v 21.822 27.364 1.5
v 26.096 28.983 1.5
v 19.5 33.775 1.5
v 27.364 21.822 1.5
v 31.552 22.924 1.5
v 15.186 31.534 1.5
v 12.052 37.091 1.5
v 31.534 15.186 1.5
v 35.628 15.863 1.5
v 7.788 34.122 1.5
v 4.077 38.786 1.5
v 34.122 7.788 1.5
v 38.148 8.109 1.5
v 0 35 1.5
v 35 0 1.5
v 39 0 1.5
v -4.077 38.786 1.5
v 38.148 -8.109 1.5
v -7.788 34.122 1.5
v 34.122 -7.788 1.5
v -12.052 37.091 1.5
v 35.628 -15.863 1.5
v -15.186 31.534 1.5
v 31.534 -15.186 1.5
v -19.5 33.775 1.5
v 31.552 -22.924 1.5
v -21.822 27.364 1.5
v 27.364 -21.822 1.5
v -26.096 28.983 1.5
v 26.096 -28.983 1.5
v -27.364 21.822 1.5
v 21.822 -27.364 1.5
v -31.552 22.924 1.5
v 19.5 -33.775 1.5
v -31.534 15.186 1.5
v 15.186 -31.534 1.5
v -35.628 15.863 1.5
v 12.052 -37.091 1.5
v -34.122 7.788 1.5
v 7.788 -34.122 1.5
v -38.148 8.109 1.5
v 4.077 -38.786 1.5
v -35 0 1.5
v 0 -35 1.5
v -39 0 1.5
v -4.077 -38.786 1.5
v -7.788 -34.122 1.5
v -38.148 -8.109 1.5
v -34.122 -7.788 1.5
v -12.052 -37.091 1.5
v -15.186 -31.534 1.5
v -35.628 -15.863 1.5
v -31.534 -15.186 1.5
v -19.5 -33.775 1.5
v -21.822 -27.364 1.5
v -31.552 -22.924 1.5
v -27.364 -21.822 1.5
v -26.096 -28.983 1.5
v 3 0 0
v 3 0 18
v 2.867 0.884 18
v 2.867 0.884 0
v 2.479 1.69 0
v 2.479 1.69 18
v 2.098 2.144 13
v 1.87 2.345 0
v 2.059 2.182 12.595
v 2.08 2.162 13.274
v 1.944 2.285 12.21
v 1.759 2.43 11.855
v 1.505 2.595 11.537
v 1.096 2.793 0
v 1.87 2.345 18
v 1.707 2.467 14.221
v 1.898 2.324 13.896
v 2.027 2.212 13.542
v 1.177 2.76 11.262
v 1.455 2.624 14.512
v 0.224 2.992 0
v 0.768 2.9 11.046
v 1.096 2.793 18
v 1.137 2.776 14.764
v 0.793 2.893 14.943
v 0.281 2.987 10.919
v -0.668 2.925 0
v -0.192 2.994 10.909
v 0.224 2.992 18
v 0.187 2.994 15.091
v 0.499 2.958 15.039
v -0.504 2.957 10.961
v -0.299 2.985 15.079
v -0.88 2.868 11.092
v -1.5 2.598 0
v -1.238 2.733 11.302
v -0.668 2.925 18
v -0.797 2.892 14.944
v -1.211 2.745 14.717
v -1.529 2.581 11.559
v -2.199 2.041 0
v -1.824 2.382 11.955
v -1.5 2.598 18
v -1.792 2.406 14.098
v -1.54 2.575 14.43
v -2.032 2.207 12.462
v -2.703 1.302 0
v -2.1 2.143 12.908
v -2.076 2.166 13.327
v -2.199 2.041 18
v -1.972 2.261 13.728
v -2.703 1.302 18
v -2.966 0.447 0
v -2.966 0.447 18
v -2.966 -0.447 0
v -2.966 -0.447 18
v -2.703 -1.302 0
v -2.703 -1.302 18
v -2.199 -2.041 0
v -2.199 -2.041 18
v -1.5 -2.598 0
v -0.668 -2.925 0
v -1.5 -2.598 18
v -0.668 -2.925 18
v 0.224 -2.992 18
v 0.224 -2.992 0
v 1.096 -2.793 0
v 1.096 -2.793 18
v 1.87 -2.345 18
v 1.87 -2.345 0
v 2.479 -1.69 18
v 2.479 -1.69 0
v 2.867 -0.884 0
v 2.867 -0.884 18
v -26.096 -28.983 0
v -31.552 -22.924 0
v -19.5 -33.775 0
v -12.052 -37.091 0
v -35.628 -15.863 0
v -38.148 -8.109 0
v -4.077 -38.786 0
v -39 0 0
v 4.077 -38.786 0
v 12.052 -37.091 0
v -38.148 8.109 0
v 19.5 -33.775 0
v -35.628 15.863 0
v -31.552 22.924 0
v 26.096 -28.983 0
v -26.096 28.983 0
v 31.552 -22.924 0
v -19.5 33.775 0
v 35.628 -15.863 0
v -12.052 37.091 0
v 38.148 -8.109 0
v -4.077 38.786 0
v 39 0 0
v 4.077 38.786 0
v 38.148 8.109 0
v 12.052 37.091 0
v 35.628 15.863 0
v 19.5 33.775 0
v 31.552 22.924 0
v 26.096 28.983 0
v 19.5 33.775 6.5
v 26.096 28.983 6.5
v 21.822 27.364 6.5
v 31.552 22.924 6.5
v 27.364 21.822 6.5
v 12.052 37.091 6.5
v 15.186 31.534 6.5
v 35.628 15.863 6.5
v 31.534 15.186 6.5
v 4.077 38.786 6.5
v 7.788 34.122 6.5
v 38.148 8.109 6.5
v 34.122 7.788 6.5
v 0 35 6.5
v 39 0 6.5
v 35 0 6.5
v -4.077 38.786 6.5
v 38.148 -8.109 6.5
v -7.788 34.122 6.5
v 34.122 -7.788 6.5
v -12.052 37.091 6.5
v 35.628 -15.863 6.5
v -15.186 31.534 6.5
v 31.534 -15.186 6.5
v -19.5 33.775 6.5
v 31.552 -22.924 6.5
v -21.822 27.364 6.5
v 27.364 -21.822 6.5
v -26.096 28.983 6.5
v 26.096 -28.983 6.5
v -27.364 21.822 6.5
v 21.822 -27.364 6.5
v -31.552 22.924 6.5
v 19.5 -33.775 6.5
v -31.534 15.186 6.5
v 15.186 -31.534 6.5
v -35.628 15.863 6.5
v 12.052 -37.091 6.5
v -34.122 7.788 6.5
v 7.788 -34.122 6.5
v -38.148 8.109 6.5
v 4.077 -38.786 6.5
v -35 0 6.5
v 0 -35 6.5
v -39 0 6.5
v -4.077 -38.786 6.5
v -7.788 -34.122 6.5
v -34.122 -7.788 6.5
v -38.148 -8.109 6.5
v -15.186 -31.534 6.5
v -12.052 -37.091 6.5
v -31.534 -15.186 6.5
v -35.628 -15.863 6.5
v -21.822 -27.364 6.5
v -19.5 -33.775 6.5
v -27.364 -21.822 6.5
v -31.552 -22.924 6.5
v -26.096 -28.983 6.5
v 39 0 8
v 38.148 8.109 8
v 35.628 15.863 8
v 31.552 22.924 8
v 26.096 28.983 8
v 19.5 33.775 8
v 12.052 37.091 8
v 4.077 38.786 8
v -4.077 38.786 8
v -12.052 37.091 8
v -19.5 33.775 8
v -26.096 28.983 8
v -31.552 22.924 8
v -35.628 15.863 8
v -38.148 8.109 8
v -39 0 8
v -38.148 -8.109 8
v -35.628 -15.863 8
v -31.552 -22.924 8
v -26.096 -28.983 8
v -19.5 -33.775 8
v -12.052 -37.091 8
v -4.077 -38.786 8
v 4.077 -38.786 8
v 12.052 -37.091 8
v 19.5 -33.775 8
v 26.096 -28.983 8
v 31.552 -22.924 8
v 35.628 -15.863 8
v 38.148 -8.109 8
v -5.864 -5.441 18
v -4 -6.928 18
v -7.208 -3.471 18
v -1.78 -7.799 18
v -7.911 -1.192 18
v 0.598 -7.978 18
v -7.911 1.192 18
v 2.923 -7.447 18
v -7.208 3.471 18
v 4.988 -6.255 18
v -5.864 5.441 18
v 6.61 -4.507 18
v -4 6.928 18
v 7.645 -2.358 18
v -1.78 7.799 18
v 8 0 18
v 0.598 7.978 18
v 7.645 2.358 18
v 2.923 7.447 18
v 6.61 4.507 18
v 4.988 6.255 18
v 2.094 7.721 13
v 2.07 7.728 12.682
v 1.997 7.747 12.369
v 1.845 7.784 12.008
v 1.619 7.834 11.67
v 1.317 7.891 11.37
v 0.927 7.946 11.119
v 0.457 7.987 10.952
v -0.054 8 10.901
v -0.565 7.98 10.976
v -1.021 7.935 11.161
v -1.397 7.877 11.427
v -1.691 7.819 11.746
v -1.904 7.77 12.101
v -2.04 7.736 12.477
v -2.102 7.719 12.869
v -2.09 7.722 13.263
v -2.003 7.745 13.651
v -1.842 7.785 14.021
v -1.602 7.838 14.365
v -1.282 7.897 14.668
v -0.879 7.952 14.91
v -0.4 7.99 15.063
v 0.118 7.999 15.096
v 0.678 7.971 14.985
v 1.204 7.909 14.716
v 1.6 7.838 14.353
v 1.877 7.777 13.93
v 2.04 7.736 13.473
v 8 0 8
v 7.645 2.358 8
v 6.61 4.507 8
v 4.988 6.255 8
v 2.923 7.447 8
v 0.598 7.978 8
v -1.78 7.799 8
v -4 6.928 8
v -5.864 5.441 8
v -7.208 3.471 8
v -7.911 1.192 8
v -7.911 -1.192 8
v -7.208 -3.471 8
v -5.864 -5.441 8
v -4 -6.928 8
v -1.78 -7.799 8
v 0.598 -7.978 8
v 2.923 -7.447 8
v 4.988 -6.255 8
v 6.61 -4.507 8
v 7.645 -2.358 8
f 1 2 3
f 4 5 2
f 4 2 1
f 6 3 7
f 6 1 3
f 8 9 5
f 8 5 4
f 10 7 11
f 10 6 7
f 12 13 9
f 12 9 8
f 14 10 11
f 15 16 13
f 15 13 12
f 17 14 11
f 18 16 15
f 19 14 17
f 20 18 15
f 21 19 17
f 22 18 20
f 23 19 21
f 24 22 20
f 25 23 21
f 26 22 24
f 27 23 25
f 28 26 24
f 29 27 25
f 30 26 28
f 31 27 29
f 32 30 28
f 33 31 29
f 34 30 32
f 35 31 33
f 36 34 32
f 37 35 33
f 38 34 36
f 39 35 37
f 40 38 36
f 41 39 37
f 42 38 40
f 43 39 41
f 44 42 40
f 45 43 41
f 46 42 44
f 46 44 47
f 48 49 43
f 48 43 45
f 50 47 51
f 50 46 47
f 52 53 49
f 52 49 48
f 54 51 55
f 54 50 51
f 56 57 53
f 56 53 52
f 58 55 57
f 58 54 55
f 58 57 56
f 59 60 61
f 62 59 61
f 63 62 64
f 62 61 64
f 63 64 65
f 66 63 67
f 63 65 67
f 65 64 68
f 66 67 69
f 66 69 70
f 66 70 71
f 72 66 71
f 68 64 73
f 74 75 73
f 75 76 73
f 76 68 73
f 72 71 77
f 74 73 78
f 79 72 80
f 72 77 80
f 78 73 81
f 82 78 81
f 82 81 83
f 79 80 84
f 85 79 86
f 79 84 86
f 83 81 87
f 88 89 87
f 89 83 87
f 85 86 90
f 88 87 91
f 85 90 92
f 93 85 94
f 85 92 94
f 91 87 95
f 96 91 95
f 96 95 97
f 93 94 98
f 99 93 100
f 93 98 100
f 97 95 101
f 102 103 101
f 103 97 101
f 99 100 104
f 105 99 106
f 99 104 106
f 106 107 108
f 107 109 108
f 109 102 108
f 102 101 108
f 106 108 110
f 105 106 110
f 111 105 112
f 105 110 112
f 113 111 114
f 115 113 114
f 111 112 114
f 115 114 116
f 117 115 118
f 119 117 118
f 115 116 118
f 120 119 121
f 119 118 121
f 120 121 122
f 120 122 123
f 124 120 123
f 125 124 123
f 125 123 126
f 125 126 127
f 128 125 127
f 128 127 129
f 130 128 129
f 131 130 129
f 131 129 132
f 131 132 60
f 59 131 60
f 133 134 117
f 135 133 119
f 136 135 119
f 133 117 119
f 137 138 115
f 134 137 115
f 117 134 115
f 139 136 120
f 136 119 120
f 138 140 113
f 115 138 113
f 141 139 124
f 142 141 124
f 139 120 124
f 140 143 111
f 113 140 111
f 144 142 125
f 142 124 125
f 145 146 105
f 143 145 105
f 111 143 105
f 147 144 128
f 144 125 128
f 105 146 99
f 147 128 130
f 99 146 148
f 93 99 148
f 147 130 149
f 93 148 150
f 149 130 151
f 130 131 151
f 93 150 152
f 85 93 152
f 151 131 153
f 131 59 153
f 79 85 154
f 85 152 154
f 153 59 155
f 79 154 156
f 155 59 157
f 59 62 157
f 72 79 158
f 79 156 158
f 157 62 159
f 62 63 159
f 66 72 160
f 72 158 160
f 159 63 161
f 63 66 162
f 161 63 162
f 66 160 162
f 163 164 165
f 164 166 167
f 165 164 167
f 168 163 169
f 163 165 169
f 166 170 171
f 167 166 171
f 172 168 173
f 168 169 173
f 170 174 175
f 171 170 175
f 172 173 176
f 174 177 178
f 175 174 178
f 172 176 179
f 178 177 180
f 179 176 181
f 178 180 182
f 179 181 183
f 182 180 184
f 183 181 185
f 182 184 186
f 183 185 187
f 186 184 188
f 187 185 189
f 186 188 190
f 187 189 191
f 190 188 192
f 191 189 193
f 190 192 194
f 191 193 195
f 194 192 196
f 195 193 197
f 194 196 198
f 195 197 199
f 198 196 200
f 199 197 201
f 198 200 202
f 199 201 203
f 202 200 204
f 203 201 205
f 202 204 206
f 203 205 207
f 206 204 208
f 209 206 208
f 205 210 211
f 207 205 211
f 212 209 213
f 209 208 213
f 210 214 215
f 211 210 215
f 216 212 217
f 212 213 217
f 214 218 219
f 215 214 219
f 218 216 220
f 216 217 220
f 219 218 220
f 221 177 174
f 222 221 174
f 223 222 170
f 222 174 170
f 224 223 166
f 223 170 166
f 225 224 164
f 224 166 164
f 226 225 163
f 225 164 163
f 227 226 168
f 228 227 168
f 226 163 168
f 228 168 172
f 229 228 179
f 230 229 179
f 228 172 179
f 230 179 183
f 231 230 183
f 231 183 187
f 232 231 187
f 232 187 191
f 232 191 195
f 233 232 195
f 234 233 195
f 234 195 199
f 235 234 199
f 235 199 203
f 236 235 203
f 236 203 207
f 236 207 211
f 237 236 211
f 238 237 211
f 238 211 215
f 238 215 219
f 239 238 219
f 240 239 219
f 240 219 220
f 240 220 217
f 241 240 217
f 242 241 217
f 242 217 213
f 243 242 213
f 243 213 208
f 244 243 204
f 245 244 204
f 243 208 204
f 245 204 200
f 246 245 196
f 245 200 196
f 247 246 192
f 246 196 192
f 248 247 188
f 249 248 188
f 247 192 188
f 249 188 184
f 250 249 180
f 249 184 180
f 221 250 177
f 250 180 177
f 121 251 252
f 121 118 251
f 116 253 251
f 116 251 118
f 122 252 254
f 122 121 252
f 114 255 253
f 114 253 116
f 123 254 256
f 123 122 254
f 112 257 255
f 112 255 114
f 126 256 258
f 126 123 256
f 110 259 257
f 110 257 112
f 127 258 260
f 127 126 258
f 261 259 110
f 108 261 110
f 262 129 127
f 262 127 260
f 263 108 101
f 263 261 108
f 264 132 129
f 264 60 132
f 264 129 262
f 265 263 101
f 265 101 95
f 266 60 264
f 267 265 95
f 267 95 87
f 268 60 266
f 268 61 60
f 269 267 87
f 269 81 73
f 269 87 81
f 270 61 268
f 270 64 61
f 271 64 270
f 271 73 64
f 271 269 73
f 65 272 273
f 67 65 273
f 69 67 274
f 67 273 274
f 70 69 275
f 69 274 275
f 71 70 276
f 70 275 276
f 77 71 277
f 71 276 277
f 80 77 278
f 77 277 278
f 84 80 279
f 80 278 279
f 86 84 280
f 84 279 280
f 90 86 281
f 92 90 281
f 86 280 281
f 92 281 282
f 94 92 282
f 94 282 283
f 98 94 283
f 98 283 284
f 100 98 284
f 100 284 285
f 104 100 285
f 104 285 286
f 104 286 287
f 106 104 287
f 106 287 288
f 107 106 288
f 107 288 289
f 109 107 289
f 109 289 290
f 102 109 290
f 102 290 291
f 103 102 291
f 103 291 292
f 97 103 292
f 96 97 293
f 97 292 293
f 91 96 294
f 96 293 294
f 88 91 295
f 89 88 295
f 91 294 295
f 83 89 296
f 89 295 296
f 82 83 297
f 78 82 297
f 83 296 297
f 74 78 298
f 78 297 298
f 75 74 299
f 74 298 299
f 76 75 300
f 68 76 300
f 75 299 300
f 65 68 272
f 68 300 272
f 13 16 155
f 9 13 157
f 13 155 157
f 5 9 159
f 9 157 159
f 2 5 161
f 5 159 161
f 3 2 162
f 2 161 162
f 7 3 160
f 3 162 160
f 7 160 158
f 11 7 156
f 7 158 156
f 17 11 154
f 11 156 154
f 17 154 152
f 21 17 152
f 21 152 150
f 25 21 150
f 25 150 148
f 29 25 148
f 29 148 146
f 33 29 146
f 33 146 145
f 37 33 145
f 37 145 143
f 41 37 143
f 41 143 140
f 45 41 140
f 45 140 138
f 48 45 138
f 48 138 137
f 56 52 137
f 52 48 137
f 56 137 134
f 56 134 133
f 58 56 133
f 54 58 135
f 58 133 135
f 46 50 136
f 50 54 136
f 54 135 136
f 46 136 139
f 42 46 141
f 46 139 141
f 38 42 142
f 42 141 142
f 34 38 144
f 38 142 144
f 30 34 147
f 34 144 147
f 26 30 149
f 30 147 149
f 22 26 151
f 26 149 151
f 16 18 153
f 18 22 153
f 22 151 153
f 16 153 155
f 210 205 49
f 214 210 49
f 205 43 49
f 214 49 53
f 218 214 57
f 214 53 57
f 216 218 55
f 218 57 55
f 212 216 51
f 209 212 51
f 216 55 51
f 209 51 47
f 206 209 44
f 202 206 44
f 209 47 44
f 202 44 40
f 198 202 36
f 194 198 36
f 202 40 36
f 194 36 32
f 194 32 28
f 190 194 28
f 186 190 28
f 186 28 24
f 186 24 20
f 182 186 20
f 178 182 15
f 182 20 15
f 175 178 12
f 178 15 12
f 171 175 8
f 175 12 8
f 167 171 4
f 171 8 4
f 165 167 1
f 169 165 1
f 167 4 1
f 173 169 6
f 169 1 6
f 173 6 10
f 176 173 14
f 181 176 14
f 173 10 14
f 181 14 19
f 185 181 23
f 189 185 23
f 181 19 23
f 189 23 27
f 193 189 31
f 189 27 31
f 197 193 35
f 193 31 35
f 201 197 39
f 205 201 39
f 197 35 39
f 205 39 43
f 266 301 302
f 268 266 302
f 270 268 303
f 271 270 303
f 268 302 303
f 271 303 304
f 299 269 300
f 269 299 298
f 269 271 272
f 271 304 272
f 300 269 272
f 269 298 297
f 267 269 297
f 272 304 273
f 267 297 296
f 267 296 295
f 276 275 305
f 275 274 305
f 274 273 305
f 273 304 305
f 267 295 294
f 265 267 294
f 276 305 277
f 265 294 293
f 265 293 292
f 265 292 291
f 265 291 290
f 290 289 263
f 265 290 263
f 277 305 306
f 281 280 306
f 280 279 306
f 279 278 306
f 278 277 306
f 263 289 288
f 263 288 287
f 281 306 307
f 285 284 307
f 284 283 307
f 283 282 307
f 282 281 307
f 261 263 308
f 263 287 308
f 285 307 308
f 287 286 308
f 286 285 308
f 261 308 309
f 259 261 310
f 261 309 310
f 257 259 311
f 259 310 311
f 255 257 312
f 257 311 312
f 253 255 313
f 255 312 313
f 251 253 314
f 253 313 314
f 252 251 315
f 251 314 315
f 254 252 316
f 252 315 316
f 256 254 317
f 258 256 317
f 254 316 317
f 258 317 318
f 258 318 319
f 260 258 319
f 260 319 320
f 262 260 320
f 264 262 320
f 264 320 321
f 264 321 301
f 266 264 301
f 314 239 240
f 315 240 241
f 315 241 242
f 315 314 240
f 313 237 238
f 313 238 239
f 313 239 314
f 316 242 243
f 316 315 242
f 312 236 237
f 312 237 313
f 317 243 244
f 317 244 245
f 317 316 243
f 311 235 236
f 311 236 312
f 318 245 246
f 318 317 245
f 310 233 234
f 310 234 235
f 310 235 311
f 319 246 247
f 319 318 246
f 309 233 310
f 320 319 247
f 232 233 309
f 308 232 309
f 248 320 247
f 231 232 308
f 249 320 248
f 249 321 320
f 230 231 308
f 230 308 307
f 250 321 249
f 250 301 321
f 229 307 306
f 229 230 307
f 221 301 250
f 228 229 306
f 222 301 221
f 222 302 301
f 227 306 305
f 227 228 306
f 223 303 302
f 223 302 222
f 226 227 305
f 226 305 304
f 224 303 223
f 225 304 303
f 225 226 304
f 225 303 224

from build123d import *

# Parameters (mm, degrees)
SKETCH1_R              = 39
BOSS_EXTRUDE1_DEPTH    = 8
SKETCH2_R              = 8
BOSS_EXTRUDE2_DEPTH    = 10
SKETCH3_R              = 3
CUT_EXTRUDE1_DEPTH     = 59.017238817
M5_TAPPED_HOLE1_REACH  = 64.446
M5_TAPPED_HOLE1_BORE_R = 2.1
SKETCH5_W              = 8
SKETCH5_H              = 5


with BuildPart() as part:
    # Sketch1 → Boss-Extrude1 (new body)
    with BuildSketch(Plane.XY):
        Circle(SKETCH1_R)
    extrude(amount=BOSS_EXTRUDE1_DEPTH)

    # Sketch2 → Boss-Extrude2 (add)
    with BuildSketch(Plane.XY.offset(8)):
        Circle(SKETCH2_R)
    extrude(amount=BOSS_EXTRUDE2_DEPTH)

    # Sketch3 → Cut-Extrude1 (cut, through all)
    with BuildSketch(Plane.XY.offset(18)):
        Circle(SKETCH3_R)
    extrude(amount=-CUT_EXTRUDE1_DEPTH, mode=Mode.SUBTRACT)

    # M5 Tapped Hole1 bore (on position points) → M5 Tapped Hole1 (cut, up to next)
    with BuildSketch(Plane(origin=(-0.006341918, 7.999997486, 13), x_dir=(0.999999685782, 0.000792739743, 0), z_dir=(-0.000792739743, 0.999999685782, 0)), mode=Mode.PRIVATE) as m5_tapped_hole1_sk1:
        Circle(M5_TAPPED_HOLE1_BORE_R)
    m5_tapped_hole1_tool1 = extrude(m5_tapped_hole1_sk1.sketch, amount=-M5_TAPPED_HOLE1_REACH, mode=Mode.PRIVATE) & part.part
    add(m5_tapped_hole1_tool1.solids().sort_by_distance((-0.006342, 7.999997, 13))[0], mode=Mode.SUBTRACT)

    # Sketch5 → Cut-Revolve1 (revolve, cut)
    with BuildSketch(Plane(origin=(0, 0, 0), x_dir=(1, 0, 0), z_dir=(0, 1, 0))):
        with Locations((-39, -4)):
            Rectangle(SKETCH5_W, SKETCH5_H)
    revolve(axis=Axis((0, 0, 0), (0, 0, 1)), mode=Mode.SUBTRACT)


solid = part.part
